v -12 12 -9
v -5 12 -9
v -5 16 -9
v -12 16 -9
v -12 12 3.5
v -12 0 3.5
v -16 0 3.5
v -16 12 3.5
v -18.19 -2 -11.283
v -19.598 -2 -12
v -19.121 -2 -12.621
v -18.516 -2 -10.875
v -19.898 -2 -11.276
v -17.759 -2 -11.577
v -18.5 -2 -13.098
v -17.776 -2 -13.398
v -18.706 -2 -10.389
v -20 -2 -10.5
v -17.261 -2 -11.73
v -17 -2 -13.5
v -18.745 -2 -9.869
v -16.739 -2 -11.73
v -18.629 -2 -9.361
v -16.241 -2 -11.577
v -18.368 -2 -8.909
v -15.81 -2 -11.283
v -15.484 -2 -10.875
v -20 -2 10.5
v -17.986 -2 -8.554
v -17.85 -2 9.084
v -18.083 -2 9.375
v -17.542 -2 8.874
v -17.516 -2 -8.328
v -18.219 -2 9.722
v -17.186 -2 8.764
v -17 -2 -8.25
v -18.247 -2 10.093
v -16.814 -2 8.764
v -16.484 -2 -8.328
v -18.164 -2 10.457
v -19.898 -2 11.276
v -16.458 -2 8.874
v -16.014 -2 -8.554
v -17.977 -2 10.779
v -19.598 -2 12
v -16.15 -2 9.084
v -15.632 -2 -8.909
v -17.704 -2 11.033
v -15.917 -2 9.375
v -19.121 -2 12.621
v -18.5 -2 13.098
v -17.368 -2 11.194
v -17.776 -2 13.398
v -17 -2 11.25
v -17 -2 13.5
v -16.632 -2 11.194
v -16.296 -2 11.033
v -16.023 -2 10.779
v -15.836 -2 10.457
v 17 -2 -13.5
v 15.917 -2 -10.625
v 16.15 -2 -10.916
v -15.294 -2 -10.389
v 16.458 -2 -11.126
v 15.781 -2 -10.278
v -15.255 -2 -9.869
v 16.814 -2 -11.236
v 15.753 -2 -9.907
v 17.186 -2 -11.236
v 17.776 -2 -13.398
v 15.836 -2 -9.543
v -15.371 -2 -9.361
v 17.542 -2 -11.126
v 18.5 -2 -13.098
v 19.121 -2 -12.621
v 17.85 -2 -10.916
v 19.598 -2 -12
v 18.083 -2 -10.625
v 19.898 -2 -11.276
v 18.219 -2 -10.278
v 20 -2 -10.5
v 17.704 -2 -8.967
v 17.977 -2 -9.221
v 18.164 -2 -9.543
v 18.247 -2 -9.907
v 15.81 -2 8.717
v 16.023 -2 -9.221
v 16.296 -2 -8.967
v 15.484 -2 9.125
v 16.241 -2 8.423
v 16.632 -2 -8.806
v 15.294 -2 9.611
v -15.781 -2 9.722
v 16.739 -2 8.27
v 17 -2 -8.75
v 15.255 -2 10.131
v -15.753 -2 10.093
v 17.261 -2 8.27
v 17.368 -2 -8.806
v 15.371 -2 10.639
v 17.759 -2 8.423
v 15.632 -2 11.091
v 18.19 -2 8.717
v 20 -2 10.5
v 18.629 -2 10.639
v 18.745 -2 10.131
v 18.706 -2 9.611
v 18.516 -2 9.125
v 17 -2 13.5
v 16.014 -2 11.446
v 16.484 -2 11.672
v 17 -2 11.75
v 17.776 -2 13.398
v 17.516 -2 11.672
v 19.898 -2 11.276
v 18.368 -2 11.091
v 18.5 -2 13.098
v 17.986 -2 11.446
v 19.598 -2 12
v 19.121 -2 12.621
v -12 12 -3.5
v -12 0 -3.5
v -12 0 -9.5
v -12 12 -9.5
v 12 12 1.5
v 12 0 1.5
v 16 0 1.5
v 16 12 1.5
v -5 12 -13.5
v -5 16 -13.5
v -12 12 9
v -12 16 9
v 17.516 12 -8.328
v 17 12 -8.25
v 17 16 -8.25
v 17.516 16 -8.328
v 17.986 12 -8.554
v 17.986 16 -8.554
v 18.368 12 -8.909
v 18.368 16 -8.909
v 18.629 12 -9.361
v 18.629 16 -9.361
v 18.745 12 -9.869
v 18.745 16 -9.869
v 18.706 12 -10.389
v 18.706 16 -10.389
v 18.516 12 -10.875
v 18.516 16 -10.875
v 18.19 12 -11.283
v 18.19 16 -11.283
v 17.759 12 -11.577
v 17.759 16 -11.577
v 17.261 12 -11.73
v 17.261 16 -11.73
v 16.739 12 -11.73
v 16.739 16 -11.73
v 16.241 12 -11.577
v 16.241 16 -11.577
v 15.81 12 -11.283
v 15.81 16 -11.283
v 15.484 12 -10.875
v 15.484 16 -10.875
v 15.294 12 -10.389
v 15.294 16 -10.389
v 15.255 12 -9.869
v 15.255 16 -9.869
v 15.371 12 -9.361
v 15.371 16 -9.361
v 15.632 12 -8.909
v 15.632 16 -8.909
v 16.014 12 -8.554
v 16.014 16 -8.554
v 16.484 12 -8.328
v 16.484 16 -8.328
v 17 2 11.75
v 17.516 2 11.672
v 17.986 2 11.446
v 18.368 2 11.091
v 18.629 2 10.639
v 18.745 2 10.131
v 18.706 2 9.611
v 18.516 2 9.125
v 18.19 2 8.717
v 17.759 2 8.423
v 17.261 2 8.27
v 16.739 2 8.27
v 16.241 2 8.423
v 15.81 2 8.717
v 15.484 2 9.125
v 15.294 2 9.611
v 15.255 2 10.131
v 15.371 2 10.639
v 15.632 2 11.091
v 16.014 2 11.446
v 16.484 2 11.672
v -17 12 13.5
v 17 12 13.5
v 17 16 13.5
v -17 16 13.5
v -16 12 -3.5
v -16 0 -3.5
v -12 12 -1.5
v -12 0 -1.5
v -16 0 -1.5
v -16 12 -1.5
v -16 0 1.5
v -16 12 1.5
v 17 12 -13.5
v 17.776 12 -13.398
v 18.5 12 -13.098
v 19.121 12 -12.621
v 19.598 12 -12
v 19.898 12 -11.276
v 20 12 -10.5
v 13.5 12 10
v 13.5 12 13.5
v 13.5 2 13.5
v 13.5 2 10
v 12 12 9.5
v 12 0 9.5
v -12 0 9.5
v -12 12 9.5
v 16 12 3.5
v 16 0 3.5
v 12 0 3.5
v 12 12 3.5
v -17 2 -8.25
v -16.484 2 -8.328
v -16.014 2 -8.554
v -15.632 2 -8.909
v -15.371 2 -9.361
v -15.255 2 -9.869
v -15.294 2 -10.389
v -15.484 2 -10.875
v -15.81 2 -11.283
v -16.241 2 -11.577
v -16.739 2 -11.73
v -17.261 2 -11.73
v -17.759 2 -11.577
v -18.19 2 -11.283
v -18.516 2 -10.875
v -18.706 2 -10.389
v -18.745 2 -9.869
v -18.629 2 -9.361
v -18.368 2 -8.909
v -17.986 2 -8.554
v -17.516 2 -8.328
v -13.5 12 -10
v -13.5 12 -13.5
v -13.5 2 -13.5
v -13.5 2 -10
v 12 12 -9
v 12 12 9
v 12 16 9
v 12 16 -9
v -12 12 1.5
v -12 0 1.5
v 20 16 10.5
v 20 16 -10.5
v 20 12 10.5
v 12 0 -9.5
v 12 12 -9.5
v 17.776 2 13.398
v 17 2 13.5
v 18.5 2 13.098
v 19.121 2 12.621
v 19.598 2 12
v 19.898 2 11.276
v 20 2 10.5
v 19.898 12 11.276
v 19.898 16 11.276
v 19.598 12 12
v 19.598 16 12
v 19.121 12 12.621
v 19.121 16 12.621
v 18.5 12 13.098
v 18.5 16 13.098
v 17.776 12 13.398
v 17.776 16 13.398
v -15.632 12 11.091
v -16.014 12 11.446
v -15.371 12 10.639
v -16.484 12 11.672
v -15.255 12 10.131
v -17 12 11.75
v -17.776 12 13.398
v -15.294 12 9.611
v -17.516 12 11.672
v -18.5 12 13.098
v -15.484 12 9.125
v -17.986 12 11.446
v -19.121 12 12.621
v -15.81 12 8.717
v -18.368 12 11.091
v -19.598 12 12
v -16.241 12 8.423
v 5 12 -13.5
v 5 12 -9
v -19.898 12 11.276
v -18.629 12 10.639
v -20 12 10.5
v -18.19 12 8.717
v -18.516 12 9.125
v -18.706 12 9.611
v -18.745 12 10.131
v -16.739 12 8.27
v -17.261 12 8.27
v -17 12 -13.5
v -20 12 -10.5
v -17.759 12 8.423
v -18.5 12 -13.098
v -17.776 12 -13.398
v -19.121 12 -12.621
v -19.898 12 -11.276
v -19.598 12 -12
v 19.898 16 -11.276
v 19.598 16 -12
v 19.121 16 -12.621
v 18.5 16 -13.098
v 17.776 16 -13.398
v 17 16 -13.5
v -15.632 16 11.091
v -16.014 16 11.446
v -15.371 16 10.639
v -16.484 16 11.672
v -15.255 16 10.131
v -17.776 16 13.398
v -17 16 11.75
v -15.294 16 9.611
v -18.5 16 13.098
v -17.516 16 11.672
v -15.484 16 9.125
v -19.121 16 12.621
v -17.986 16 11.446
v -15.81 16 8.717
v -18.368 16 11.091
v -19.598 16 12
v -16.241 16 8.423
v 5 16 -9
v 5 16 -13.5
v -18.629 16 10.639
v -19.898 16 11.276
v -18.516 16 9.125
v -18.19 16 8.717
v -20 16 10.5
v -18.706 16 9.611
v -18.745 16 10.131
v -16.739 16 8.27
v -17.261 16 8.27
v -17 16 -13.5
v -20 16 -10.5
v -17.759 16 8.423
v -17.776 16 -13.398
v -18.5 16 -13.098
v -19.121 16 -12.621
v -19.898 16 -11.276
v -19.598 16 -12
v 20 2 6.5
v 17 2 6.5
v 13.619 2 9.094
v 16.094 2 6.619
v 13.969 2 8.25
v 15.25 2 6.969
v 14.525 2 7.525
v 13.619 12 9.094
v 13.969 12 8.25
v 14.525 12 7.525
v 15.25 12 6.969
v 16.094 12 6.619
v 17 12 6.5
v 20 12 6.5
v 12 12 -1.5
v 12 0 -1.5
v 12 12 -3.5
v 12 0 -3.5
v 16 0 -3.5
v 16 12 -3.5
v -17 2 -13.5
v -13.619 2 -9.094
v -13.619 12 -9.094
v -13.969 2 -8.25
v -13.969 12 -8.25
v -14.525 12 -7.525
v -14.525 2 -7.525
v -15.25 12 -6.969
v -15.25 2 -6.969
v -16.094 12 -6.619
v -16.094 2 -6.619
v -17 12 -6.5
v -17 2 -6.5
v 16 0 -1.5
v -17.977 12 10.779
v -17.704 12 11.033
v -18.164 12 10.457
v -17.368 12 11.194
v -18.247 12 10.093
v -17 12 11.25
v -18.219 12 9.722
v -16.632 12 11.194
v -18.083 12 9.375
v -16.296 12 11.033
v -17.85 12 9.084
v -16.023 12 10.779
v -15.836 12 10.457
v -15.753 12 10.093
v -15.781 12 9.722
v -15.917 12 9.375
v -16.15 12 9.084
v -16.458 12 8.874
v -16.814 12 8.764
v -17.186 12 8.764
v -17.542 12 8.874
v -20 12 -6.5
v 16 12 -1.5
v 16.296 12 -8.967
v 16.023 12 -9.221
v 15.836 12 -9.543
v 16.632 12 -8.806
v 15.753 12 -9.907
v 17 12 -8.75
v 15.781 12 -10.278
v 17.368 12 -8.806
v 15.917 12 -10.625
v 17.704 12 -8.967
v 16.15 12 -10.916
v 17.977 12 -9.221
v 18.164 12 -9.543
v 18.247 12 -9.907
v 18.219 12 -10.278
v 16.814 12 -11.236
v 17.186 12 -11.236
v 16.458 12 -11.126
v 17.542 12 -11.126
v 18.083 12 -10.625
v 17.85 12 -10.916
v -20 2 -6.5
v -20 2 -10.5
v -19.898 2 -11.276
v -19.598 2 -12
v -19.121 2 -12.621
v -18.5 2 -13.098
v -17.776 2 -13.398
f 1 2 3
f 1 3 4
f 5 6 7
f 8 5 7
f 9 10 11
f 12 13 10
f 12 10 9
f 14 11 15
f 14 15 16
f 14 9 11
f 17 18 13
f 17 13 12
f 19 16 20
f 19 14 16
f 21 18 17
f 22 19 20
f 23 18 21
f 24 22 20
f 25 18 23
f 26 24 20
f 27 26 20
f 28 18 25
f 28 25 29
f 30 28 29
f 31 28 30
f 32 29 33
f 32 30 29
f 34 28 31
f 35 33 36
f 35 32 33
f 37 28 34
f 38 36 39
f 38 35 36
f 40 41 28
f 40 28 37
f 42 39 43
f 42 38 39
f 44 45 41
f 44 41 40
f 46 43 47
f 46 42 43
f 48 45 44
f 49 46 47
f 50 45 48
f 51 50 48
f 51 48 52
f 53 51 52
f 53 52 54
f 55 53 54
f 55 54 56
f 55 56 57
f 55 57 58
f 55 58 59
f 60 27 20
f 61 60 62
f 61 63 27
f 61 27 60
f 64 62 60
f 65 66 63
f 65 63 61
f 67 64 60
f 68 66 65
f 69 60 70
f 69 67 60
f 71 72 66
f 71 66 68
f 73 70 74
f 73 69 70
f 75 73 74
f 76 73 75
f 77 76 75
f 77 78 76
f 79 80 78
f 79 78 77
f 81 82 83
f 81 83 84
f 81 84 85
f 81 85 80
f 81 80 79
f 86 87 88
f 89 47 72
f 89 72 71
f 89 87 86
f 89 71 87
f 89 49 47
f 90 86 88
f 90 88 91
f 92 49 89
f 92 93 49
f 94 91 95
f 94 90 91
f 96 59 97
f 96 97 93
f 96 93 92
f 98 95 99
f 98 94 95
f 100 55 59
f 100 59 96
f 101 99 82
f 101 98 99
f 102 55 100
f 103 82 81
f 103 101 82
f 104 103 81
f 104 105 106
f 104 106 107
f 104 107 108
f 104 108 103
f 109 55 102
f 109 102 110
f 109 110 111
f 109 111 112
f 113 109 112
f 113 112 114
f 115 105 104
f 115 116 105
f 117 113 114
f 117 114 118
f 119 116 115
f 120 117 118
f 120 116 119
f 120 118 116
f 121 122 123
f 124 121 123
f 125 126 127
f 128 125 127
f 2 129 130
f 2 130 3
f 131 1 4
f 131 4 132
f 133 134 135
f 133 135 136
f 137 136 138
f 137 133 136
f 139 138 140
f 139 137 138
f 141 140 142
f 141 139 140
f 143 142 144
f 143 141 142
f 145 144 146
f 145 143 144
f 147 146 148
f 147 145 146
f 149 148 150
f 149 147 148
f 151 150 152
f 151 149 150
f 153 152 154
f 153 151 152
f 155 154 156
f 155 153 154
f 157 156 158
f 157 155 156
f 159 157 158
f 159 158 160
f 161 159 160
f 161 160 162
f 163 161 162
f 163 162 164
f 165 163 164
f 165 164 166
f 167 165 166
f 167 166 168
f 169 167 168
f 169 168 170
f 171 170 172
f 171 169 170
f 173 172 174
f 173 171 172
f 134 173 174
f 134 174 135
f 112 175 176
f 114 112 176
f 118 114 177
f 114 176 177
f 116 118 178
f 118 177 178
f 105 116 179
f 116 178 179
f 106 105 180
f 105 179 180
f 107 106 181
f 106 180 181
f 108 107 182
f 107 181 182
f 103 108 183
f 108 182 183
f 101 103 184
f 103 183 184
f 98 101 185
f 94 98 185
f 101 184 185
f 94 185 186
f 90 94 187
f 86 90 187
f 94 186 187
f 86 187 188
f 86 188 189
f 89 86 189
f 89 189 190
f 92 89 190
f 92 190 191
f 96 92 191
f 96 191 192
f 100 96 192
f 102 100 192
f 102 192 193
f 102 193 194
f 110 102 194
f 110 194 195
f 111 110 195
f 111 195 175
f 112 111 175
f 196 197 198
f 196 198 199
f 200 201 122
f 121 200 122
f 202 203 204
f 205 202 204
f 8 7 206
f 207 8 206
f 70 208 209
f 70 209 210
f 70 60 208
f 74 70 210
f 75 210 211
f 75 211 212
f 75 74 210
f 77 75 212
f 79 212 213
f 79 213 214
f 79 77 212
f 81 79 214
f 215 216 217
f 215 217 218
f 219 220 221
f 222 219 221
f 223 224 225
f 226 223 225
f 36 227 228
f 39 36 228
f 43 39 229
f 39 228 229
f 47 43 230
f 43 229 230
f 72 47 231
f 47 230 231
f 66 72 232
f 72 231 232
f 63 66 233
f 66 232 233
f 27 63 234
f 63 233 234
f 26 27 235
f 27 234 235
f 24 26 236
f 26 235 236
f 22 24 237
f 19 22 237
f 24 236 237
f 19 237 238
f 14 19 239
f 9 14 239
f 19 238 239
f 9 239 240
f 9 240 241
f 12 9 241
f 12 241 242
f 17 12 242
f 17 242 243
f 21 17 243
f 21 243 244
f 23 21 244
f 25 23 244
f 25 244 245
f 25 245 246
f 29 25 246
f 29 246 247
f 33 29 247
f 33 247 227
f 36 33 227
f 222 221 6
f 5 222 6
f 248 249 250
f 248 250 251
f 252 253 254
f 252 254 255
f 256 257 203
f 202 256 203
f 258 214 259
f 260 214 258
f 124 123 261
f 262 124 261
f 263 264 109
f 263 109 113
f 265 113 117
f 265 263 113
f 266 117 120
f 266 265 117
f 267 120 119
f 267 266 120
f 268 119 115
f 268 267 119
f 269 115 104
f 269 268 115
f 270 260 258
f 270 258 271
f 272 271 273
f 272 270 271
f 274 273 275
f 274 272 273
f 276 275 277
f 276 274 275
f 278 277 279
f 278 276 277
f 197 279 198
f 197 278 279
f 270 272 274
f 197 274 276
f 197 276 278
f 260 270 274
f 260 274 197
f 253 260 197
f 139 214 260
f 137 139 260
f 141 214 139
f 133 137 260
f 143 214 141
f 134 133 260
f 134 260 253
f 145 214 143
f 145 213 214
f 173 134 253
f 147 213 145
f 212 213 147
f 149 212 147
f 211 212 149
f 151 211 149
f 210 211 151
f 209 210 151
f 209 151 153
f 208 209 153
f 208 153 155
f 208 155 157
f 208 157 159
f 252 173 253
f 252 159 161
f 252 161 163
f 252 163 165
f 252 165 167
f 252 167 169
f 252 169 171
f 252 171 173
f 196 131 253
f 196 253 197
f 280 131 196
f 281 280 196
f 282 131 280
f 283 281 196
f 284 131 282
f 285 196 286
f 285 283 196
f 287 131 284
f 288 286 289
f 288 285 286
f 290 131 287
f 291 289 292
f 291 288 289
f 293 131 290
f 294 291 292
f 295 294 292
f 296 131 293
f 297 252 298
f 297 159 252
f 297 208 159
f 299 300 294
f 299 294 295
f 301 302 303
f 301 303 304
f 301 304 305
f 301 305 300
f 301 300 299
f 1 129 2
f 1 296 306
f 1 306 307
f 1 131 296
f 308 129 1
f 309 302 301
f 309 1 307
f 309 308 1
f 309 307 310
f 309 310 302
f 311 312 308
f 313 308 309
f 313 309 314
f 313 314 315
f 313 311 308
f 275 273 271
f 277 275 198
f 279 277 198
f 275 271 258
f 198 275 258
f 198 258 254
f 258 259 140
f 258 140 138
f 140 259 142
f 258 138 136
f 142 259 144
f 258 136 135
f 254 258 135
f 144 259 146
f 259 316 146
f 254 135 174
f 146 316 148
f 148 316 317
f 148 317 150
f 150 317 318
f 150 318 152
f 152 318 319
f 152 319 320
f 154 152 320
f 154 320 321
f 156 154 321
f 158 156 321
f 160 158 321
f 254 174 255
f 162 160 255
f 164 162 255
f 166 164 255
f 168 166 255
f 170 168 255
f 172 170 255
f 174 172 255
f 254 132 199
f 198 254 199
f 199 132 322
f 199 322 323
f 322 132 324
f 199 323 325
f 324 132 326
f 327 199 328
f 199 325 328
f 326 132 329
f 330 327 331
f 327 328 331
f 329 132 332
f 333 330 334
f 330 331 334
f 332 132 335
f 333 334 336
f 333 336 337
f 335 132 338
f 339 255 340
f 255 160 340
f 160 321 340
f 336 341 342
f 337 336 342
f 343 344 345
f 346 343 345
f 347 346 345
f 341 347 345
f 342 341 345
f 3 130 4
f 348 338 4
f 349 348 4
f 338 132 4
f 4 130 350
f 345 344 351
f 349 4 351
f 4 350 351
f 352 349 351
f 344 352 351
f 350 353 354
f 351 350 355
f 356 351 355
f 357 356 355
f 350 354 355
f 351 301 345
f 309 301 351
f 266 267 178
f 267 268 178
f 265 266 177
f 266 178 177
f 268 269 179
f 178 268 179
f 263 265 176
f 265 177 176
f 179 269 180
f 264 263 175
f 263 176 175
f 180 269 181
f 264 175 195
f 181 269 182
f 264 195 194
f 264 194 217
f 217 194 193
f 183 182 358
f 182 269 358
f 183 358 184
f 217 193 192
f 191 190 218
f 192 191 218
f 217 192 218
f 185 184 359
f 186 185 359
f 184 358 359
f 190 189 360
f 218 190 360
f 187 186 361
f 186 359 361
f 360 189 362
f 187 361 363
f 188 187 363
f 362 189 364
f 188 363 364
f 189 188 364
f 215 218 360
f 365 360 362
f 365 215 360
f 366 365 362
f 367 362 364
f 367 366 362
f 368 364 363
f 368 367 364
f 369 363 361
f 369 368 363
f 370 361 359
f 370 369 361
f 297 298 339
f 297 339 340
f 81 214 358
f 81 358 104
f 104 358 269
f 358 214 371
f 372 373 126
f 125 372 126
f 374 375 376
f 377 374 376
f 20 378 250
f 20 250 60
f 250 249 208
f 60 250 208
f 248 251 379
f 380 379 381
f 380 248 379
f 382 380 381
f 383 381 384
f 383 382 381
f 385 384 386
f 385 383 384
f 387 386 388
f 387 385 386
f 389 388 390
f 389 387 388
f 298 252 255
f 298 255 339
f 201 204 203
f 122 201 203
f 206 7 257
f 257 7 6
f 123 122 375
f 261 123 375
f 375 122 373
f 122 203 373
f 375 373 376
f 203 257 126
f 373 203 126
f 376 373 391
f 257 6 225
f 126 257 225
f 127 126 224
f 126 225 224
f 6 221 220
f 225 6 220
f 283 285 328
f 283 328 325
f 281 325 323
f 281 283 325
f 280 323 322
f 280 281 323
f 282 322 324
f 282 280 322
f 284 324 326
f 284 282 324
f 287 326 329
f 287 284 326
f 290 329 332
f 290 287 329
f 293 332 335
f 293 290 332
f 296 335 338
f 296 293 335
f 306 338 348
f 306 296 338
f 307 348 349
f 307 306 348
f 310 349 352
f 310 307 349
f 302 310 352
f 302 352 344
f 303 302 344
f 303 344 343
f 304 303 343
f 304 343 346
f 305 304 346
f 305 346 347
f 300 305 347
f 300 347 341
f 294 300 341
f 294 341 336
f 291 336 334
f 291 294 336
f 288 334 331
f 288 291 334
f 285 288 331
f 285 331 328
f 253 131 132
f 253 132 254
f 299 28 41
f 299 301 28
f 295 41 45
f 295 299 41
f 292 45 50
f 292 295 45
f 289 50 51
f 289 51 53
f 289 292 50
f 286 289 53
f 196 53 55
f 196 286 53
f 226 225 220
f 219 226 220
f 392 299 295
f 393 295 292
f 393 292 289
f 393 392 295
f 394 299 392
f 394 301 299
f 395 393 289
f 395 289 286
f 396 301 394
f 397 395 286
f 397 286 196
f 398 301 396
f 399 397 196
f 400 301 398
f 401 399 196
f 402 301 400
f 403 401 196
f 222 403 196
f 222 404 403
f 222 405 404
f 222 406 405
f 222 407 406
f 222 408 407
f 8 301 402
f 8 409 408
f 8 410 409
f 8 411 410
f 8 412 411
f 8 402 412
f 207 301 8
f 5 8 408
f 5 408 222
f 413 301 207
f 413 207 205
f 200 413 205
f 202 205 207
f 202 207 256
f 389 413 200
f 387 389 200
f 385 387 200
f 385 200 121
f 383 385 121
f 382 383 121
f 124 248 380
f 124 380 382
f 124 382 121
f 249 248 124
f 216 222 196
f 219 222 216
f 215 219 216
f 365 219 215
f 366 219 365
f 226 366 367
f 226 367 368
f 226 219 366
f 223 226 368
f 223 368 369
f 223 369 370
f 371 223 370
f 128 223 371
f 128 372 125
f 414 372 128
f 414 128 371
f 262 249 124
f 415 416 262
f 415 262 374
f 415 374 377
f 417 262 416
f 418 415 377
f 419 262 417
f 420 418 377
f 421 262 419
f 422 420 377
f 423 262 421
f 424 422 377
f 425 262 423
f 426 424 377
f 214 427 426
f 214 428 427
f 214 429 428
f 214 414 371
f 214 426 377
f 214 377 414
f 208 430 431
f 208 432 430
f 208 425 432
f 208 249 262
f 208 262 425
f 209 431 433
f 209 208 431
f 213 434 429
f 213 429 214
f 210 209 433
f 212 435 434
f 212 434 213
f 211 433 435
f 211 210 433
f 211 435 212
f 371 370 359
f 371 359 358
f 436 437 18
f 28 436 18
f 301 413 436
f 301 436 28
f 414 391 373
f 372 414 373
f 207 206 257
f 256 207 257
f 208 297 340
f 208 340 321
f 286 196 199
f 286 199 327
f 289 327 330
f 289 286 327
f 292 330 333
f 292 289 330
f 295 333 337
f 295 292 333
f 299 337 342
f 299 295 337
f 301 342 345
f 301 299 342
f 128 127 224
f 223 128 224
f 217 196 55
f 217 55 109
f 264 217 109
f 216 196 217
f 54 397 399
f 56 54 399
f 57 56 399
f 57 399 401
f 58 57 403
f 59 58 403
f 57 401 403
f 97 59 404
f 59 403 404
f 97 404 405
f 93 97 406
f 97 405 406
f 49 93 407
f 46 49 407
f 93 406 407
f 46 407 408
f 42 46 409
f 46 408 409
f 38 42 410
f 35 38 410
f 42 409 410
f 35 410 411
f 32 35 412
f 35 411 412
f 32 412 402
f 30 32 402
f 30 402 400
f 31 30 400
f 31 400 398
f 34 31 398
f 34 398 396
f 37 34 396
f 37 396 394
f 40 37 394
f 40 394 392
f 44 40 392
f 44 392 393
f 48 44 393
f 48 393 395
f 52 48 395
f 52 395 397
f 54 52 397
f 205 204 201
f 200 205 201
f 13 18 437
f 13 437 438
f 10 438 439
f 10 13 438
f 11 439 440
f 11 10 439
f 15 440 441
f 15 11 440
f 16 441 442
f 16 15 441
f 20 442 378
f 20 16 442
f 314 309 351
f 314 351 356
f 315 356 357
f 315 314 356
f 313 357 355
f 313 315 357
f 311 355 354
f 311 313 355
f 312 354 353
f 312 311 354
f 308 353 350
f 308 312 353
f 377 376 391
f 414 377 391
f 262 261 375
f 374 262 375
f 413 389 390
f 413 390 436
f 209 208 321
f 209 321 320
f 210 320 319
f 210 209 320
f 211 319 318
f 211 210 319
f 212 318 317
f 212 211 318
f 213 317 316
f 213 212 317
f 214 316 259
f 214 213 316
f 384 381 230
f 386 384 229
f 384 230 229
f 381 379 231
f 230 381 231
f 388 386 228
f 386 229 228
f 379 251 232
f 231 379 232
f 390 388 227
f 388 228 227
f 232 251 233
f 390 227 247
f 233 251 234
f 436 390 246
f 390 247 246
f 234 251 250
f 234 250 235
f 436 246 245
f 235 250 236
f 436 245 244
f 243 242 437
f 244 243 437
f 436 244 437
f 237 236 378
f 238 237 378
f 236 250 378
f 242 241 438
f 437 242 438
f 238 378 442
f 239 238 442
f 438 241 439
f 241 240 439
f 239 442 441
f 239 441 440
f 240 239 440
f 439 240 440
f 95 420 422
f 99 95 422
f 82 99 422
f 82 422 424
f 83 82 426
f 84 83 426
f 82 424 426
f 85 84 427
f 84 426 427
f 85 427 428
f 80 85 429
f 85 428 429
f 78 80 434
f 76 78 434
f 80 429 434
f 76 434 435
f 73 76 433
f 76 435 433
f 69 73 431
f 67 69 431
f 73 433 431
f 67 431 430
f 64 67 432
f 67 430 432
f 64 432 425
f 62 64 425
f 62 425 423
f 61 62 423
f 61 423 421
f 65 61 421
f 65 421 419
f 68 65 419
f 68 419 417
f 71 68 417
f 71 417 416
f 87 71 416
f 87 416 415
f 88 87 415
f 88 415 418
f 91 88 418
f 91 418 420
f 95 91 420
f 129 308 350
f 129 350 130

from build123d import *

# Parameters (mm, degrees)
SKETCH1_W           = 40
SKETCH1_H           = 27
BOSS_EXTRUDE1_DEPTH = 12
SKETCH2_W           = 40
SKETCH2_H           = 27
BOSS_EXTRUDE2_DEPTH = 2
SKETCH3_R           = 1.25
CUT_EXTRUDE1_DEPTH  = 28.897132469
FILLET1_R           = 3
SKETCH4_R           = 1.75
CUT_EXTRUDE2_DEPTH  = 28.897132469
CUT_EXTRUDE3_DEPTH  = 10
SKETCH6_R           = 1.75
BOSS_EXTRUDE3_DEPTH = 4


with BuildPart() as part:
    # Sketch1 → Boss-Extrude1 (new body)
    with BuildSketch(Plane(origin=(0, 0, 0), x_dir=(1, 0, 0), z_dir=(0, 1, 0))):
        Rectangle(SKETCH1_W, SKETCH1_H)
        Polygon((12, -3.5), (12, -9.5), (-12, -9.5), (-12, -3.5), (-16, -3.5), (-16, -1.5), (-12, -1.5), (-12, 1.5), (-16, 1.5), (-16, 3.5), (-12, 3.5), (-12, 9.5), (12, 9.5), (12, 3.5), (16, 3.5), (16, 1.5), (12, 1.5), (12, -1.5), (16, -1.5), (16, -3.5), align=None, mode=Mode.SUBTRACT)
    extrude(amount=BOSS_EXTRUDE1_DEPTH)

    # Sketch2 → Boss-Extrude2 (add)
    with BuildSketch(Plane.XZ):
        Rectangle(SKETCH2_W, SKETCH2_H)
    extrude(amount=BOSS_EXTRUDE2_DEPTH)

    # Sketch3 → Cut-Extrude1 (cut, through all)
    with BuildSketch(Plane(origin=(0, 12, 0), x_dir=(1, 0, 0), z_dir=(0, 1, 0))):
        with Locations(Location((-17, 10, 0), (0, 0, 270))):
            Circle(SKETCH3_R)
        with Locations(Location((17, 10, 0), (0, 0, 270))):
            Circle(SKETCH3_R)
        with Locations(Location((17, -10, 0), (0, 0, 270))):
            Circle(SKETCH3_R)
        with Locations(Location((-17, -10, 0), (0, 0, 270))):
            Circle(SKETCH3_R)
    extrude(amount=-CUT_EXTRUDE1_DEPTH, mode=Mode.SUBTRACT)

    # Fillet1
    fillet1_edges = [part.edges().sort_by_distance(p)[0] for p in [
        (-20, 5, -13.5),
        (20, 5, -13.5),
        (20, 5, 13.5),
        (-20, 5, 13.5),
    ]]
    fillet(fillet1_edges, radius=FILLET1_R)

    # Sketch4 → Cut-Extrude2 (cut, through all)
    with BuildSketch(Plane(origin=(0, 12, 0), x_dir=(1, 0, 0), z_dir=(0, 1, 0))):
        with Locations(Location((-17, 10, 0), (0, 0, 270))):
            Circle(SKETCH4_R)
        with Locations(Location((17, -10, 0), (0, 0, 270))):
            Circle(SKETCH4_R)
    extrude(amount=-CUT_EXTRUDE2_DEPTH, mode=Mode.SUBTRACT)

    # Sketch5 → Cut-Extrude3 (cut)
    with BuildSketch(Plane(origin=(0, 12, 0), x_dir=(1, 0, 0), z_dir=(0, 1, 0))):
        with BuildLine():
            Line((-17, 6.5), (-20, 6.5))
            Line((-20, 6.5), (-20, 13.5))
            Line((-20, 13.5), (-13.5, 13.5))
            Line((-13.5, 13.5), (-13.5, 10))
            ThreePointArc((-13.5, 10), (-14.525126266, 7.525126266), (-17, 6.5))
        make_face()
        with BuildLine():
            Line((17, -6.5), (20, -6.5))
            Line((20, -6.5), (20, -13.5))
            Line((20, -13.5), (13.5, -13.5))
            Line((13.5, -13.5), (13.5, -10))
            ThreePointArc((13.5, -10), (14.525126266, -7.525126266), (17, -6.5))
        make_face()
    extrude(amount=-CUT_EXTRUDE3_DEPTH, mode=Mode.SUBTRACT)


with BuildPart() as body_2:
    # Sketch6 → Boss-Extrude3 (new body)
    with BuildSketch(Plane(origin=(0, 12, 0), x_dir=(1, 0, 0), z_dir=(0, 1, 0))):
        with BuildLine():
            Line((-5, 13.5), (-5, 9))
            Line((-5, 9), (-12, 9))
            Line((-12, 9), (-12, -9))
            Line((-12, -9), (12, -9))
            Line((12, -9), (12, 9))
            Line((12, 9), (5, 9))
            Line((5, 9), (5, 13.5))
            Line((5, 13.5), (17, 13.5))
            ThreePointArc((17, 13.5), (19.121320344, 12.621320344), (20, 10.5))
            Line((20, 10.5), (20, -10.5))
            ThreePointArc((20, -10.5), (19.121320344, -12.621320344), (17, -13.5))
            Line((17, -13.5), (-17, -13.5))
            ThreePointArc((-17, -13.5), (-19.121320344, -12.621320344), (-20, -10.5))
            Line((-20, -10.5), (-20, 10.5))
            ThreePointArc((-20, 10.5), (-19.121320344, 12.621320344), (-17, 13.5))
            Line((-17, 13.5), (-5, 13.5))
        make_face()
        with Locations(Location((-17, -10, 0), (0, 0, 270))):
            Circle(SKETCH6_R, mode=Mode.SUBTRACT)
        with Locations(Location((17, 10, 0), (0, 0, 270))):
            Circle(SKETCH6_R, mode=Mode.SUBTRACT)
    extrude(amount=BOSS_EXTRUDE3_DEPTH)


solid = Compound([part.part, body_2.part])
